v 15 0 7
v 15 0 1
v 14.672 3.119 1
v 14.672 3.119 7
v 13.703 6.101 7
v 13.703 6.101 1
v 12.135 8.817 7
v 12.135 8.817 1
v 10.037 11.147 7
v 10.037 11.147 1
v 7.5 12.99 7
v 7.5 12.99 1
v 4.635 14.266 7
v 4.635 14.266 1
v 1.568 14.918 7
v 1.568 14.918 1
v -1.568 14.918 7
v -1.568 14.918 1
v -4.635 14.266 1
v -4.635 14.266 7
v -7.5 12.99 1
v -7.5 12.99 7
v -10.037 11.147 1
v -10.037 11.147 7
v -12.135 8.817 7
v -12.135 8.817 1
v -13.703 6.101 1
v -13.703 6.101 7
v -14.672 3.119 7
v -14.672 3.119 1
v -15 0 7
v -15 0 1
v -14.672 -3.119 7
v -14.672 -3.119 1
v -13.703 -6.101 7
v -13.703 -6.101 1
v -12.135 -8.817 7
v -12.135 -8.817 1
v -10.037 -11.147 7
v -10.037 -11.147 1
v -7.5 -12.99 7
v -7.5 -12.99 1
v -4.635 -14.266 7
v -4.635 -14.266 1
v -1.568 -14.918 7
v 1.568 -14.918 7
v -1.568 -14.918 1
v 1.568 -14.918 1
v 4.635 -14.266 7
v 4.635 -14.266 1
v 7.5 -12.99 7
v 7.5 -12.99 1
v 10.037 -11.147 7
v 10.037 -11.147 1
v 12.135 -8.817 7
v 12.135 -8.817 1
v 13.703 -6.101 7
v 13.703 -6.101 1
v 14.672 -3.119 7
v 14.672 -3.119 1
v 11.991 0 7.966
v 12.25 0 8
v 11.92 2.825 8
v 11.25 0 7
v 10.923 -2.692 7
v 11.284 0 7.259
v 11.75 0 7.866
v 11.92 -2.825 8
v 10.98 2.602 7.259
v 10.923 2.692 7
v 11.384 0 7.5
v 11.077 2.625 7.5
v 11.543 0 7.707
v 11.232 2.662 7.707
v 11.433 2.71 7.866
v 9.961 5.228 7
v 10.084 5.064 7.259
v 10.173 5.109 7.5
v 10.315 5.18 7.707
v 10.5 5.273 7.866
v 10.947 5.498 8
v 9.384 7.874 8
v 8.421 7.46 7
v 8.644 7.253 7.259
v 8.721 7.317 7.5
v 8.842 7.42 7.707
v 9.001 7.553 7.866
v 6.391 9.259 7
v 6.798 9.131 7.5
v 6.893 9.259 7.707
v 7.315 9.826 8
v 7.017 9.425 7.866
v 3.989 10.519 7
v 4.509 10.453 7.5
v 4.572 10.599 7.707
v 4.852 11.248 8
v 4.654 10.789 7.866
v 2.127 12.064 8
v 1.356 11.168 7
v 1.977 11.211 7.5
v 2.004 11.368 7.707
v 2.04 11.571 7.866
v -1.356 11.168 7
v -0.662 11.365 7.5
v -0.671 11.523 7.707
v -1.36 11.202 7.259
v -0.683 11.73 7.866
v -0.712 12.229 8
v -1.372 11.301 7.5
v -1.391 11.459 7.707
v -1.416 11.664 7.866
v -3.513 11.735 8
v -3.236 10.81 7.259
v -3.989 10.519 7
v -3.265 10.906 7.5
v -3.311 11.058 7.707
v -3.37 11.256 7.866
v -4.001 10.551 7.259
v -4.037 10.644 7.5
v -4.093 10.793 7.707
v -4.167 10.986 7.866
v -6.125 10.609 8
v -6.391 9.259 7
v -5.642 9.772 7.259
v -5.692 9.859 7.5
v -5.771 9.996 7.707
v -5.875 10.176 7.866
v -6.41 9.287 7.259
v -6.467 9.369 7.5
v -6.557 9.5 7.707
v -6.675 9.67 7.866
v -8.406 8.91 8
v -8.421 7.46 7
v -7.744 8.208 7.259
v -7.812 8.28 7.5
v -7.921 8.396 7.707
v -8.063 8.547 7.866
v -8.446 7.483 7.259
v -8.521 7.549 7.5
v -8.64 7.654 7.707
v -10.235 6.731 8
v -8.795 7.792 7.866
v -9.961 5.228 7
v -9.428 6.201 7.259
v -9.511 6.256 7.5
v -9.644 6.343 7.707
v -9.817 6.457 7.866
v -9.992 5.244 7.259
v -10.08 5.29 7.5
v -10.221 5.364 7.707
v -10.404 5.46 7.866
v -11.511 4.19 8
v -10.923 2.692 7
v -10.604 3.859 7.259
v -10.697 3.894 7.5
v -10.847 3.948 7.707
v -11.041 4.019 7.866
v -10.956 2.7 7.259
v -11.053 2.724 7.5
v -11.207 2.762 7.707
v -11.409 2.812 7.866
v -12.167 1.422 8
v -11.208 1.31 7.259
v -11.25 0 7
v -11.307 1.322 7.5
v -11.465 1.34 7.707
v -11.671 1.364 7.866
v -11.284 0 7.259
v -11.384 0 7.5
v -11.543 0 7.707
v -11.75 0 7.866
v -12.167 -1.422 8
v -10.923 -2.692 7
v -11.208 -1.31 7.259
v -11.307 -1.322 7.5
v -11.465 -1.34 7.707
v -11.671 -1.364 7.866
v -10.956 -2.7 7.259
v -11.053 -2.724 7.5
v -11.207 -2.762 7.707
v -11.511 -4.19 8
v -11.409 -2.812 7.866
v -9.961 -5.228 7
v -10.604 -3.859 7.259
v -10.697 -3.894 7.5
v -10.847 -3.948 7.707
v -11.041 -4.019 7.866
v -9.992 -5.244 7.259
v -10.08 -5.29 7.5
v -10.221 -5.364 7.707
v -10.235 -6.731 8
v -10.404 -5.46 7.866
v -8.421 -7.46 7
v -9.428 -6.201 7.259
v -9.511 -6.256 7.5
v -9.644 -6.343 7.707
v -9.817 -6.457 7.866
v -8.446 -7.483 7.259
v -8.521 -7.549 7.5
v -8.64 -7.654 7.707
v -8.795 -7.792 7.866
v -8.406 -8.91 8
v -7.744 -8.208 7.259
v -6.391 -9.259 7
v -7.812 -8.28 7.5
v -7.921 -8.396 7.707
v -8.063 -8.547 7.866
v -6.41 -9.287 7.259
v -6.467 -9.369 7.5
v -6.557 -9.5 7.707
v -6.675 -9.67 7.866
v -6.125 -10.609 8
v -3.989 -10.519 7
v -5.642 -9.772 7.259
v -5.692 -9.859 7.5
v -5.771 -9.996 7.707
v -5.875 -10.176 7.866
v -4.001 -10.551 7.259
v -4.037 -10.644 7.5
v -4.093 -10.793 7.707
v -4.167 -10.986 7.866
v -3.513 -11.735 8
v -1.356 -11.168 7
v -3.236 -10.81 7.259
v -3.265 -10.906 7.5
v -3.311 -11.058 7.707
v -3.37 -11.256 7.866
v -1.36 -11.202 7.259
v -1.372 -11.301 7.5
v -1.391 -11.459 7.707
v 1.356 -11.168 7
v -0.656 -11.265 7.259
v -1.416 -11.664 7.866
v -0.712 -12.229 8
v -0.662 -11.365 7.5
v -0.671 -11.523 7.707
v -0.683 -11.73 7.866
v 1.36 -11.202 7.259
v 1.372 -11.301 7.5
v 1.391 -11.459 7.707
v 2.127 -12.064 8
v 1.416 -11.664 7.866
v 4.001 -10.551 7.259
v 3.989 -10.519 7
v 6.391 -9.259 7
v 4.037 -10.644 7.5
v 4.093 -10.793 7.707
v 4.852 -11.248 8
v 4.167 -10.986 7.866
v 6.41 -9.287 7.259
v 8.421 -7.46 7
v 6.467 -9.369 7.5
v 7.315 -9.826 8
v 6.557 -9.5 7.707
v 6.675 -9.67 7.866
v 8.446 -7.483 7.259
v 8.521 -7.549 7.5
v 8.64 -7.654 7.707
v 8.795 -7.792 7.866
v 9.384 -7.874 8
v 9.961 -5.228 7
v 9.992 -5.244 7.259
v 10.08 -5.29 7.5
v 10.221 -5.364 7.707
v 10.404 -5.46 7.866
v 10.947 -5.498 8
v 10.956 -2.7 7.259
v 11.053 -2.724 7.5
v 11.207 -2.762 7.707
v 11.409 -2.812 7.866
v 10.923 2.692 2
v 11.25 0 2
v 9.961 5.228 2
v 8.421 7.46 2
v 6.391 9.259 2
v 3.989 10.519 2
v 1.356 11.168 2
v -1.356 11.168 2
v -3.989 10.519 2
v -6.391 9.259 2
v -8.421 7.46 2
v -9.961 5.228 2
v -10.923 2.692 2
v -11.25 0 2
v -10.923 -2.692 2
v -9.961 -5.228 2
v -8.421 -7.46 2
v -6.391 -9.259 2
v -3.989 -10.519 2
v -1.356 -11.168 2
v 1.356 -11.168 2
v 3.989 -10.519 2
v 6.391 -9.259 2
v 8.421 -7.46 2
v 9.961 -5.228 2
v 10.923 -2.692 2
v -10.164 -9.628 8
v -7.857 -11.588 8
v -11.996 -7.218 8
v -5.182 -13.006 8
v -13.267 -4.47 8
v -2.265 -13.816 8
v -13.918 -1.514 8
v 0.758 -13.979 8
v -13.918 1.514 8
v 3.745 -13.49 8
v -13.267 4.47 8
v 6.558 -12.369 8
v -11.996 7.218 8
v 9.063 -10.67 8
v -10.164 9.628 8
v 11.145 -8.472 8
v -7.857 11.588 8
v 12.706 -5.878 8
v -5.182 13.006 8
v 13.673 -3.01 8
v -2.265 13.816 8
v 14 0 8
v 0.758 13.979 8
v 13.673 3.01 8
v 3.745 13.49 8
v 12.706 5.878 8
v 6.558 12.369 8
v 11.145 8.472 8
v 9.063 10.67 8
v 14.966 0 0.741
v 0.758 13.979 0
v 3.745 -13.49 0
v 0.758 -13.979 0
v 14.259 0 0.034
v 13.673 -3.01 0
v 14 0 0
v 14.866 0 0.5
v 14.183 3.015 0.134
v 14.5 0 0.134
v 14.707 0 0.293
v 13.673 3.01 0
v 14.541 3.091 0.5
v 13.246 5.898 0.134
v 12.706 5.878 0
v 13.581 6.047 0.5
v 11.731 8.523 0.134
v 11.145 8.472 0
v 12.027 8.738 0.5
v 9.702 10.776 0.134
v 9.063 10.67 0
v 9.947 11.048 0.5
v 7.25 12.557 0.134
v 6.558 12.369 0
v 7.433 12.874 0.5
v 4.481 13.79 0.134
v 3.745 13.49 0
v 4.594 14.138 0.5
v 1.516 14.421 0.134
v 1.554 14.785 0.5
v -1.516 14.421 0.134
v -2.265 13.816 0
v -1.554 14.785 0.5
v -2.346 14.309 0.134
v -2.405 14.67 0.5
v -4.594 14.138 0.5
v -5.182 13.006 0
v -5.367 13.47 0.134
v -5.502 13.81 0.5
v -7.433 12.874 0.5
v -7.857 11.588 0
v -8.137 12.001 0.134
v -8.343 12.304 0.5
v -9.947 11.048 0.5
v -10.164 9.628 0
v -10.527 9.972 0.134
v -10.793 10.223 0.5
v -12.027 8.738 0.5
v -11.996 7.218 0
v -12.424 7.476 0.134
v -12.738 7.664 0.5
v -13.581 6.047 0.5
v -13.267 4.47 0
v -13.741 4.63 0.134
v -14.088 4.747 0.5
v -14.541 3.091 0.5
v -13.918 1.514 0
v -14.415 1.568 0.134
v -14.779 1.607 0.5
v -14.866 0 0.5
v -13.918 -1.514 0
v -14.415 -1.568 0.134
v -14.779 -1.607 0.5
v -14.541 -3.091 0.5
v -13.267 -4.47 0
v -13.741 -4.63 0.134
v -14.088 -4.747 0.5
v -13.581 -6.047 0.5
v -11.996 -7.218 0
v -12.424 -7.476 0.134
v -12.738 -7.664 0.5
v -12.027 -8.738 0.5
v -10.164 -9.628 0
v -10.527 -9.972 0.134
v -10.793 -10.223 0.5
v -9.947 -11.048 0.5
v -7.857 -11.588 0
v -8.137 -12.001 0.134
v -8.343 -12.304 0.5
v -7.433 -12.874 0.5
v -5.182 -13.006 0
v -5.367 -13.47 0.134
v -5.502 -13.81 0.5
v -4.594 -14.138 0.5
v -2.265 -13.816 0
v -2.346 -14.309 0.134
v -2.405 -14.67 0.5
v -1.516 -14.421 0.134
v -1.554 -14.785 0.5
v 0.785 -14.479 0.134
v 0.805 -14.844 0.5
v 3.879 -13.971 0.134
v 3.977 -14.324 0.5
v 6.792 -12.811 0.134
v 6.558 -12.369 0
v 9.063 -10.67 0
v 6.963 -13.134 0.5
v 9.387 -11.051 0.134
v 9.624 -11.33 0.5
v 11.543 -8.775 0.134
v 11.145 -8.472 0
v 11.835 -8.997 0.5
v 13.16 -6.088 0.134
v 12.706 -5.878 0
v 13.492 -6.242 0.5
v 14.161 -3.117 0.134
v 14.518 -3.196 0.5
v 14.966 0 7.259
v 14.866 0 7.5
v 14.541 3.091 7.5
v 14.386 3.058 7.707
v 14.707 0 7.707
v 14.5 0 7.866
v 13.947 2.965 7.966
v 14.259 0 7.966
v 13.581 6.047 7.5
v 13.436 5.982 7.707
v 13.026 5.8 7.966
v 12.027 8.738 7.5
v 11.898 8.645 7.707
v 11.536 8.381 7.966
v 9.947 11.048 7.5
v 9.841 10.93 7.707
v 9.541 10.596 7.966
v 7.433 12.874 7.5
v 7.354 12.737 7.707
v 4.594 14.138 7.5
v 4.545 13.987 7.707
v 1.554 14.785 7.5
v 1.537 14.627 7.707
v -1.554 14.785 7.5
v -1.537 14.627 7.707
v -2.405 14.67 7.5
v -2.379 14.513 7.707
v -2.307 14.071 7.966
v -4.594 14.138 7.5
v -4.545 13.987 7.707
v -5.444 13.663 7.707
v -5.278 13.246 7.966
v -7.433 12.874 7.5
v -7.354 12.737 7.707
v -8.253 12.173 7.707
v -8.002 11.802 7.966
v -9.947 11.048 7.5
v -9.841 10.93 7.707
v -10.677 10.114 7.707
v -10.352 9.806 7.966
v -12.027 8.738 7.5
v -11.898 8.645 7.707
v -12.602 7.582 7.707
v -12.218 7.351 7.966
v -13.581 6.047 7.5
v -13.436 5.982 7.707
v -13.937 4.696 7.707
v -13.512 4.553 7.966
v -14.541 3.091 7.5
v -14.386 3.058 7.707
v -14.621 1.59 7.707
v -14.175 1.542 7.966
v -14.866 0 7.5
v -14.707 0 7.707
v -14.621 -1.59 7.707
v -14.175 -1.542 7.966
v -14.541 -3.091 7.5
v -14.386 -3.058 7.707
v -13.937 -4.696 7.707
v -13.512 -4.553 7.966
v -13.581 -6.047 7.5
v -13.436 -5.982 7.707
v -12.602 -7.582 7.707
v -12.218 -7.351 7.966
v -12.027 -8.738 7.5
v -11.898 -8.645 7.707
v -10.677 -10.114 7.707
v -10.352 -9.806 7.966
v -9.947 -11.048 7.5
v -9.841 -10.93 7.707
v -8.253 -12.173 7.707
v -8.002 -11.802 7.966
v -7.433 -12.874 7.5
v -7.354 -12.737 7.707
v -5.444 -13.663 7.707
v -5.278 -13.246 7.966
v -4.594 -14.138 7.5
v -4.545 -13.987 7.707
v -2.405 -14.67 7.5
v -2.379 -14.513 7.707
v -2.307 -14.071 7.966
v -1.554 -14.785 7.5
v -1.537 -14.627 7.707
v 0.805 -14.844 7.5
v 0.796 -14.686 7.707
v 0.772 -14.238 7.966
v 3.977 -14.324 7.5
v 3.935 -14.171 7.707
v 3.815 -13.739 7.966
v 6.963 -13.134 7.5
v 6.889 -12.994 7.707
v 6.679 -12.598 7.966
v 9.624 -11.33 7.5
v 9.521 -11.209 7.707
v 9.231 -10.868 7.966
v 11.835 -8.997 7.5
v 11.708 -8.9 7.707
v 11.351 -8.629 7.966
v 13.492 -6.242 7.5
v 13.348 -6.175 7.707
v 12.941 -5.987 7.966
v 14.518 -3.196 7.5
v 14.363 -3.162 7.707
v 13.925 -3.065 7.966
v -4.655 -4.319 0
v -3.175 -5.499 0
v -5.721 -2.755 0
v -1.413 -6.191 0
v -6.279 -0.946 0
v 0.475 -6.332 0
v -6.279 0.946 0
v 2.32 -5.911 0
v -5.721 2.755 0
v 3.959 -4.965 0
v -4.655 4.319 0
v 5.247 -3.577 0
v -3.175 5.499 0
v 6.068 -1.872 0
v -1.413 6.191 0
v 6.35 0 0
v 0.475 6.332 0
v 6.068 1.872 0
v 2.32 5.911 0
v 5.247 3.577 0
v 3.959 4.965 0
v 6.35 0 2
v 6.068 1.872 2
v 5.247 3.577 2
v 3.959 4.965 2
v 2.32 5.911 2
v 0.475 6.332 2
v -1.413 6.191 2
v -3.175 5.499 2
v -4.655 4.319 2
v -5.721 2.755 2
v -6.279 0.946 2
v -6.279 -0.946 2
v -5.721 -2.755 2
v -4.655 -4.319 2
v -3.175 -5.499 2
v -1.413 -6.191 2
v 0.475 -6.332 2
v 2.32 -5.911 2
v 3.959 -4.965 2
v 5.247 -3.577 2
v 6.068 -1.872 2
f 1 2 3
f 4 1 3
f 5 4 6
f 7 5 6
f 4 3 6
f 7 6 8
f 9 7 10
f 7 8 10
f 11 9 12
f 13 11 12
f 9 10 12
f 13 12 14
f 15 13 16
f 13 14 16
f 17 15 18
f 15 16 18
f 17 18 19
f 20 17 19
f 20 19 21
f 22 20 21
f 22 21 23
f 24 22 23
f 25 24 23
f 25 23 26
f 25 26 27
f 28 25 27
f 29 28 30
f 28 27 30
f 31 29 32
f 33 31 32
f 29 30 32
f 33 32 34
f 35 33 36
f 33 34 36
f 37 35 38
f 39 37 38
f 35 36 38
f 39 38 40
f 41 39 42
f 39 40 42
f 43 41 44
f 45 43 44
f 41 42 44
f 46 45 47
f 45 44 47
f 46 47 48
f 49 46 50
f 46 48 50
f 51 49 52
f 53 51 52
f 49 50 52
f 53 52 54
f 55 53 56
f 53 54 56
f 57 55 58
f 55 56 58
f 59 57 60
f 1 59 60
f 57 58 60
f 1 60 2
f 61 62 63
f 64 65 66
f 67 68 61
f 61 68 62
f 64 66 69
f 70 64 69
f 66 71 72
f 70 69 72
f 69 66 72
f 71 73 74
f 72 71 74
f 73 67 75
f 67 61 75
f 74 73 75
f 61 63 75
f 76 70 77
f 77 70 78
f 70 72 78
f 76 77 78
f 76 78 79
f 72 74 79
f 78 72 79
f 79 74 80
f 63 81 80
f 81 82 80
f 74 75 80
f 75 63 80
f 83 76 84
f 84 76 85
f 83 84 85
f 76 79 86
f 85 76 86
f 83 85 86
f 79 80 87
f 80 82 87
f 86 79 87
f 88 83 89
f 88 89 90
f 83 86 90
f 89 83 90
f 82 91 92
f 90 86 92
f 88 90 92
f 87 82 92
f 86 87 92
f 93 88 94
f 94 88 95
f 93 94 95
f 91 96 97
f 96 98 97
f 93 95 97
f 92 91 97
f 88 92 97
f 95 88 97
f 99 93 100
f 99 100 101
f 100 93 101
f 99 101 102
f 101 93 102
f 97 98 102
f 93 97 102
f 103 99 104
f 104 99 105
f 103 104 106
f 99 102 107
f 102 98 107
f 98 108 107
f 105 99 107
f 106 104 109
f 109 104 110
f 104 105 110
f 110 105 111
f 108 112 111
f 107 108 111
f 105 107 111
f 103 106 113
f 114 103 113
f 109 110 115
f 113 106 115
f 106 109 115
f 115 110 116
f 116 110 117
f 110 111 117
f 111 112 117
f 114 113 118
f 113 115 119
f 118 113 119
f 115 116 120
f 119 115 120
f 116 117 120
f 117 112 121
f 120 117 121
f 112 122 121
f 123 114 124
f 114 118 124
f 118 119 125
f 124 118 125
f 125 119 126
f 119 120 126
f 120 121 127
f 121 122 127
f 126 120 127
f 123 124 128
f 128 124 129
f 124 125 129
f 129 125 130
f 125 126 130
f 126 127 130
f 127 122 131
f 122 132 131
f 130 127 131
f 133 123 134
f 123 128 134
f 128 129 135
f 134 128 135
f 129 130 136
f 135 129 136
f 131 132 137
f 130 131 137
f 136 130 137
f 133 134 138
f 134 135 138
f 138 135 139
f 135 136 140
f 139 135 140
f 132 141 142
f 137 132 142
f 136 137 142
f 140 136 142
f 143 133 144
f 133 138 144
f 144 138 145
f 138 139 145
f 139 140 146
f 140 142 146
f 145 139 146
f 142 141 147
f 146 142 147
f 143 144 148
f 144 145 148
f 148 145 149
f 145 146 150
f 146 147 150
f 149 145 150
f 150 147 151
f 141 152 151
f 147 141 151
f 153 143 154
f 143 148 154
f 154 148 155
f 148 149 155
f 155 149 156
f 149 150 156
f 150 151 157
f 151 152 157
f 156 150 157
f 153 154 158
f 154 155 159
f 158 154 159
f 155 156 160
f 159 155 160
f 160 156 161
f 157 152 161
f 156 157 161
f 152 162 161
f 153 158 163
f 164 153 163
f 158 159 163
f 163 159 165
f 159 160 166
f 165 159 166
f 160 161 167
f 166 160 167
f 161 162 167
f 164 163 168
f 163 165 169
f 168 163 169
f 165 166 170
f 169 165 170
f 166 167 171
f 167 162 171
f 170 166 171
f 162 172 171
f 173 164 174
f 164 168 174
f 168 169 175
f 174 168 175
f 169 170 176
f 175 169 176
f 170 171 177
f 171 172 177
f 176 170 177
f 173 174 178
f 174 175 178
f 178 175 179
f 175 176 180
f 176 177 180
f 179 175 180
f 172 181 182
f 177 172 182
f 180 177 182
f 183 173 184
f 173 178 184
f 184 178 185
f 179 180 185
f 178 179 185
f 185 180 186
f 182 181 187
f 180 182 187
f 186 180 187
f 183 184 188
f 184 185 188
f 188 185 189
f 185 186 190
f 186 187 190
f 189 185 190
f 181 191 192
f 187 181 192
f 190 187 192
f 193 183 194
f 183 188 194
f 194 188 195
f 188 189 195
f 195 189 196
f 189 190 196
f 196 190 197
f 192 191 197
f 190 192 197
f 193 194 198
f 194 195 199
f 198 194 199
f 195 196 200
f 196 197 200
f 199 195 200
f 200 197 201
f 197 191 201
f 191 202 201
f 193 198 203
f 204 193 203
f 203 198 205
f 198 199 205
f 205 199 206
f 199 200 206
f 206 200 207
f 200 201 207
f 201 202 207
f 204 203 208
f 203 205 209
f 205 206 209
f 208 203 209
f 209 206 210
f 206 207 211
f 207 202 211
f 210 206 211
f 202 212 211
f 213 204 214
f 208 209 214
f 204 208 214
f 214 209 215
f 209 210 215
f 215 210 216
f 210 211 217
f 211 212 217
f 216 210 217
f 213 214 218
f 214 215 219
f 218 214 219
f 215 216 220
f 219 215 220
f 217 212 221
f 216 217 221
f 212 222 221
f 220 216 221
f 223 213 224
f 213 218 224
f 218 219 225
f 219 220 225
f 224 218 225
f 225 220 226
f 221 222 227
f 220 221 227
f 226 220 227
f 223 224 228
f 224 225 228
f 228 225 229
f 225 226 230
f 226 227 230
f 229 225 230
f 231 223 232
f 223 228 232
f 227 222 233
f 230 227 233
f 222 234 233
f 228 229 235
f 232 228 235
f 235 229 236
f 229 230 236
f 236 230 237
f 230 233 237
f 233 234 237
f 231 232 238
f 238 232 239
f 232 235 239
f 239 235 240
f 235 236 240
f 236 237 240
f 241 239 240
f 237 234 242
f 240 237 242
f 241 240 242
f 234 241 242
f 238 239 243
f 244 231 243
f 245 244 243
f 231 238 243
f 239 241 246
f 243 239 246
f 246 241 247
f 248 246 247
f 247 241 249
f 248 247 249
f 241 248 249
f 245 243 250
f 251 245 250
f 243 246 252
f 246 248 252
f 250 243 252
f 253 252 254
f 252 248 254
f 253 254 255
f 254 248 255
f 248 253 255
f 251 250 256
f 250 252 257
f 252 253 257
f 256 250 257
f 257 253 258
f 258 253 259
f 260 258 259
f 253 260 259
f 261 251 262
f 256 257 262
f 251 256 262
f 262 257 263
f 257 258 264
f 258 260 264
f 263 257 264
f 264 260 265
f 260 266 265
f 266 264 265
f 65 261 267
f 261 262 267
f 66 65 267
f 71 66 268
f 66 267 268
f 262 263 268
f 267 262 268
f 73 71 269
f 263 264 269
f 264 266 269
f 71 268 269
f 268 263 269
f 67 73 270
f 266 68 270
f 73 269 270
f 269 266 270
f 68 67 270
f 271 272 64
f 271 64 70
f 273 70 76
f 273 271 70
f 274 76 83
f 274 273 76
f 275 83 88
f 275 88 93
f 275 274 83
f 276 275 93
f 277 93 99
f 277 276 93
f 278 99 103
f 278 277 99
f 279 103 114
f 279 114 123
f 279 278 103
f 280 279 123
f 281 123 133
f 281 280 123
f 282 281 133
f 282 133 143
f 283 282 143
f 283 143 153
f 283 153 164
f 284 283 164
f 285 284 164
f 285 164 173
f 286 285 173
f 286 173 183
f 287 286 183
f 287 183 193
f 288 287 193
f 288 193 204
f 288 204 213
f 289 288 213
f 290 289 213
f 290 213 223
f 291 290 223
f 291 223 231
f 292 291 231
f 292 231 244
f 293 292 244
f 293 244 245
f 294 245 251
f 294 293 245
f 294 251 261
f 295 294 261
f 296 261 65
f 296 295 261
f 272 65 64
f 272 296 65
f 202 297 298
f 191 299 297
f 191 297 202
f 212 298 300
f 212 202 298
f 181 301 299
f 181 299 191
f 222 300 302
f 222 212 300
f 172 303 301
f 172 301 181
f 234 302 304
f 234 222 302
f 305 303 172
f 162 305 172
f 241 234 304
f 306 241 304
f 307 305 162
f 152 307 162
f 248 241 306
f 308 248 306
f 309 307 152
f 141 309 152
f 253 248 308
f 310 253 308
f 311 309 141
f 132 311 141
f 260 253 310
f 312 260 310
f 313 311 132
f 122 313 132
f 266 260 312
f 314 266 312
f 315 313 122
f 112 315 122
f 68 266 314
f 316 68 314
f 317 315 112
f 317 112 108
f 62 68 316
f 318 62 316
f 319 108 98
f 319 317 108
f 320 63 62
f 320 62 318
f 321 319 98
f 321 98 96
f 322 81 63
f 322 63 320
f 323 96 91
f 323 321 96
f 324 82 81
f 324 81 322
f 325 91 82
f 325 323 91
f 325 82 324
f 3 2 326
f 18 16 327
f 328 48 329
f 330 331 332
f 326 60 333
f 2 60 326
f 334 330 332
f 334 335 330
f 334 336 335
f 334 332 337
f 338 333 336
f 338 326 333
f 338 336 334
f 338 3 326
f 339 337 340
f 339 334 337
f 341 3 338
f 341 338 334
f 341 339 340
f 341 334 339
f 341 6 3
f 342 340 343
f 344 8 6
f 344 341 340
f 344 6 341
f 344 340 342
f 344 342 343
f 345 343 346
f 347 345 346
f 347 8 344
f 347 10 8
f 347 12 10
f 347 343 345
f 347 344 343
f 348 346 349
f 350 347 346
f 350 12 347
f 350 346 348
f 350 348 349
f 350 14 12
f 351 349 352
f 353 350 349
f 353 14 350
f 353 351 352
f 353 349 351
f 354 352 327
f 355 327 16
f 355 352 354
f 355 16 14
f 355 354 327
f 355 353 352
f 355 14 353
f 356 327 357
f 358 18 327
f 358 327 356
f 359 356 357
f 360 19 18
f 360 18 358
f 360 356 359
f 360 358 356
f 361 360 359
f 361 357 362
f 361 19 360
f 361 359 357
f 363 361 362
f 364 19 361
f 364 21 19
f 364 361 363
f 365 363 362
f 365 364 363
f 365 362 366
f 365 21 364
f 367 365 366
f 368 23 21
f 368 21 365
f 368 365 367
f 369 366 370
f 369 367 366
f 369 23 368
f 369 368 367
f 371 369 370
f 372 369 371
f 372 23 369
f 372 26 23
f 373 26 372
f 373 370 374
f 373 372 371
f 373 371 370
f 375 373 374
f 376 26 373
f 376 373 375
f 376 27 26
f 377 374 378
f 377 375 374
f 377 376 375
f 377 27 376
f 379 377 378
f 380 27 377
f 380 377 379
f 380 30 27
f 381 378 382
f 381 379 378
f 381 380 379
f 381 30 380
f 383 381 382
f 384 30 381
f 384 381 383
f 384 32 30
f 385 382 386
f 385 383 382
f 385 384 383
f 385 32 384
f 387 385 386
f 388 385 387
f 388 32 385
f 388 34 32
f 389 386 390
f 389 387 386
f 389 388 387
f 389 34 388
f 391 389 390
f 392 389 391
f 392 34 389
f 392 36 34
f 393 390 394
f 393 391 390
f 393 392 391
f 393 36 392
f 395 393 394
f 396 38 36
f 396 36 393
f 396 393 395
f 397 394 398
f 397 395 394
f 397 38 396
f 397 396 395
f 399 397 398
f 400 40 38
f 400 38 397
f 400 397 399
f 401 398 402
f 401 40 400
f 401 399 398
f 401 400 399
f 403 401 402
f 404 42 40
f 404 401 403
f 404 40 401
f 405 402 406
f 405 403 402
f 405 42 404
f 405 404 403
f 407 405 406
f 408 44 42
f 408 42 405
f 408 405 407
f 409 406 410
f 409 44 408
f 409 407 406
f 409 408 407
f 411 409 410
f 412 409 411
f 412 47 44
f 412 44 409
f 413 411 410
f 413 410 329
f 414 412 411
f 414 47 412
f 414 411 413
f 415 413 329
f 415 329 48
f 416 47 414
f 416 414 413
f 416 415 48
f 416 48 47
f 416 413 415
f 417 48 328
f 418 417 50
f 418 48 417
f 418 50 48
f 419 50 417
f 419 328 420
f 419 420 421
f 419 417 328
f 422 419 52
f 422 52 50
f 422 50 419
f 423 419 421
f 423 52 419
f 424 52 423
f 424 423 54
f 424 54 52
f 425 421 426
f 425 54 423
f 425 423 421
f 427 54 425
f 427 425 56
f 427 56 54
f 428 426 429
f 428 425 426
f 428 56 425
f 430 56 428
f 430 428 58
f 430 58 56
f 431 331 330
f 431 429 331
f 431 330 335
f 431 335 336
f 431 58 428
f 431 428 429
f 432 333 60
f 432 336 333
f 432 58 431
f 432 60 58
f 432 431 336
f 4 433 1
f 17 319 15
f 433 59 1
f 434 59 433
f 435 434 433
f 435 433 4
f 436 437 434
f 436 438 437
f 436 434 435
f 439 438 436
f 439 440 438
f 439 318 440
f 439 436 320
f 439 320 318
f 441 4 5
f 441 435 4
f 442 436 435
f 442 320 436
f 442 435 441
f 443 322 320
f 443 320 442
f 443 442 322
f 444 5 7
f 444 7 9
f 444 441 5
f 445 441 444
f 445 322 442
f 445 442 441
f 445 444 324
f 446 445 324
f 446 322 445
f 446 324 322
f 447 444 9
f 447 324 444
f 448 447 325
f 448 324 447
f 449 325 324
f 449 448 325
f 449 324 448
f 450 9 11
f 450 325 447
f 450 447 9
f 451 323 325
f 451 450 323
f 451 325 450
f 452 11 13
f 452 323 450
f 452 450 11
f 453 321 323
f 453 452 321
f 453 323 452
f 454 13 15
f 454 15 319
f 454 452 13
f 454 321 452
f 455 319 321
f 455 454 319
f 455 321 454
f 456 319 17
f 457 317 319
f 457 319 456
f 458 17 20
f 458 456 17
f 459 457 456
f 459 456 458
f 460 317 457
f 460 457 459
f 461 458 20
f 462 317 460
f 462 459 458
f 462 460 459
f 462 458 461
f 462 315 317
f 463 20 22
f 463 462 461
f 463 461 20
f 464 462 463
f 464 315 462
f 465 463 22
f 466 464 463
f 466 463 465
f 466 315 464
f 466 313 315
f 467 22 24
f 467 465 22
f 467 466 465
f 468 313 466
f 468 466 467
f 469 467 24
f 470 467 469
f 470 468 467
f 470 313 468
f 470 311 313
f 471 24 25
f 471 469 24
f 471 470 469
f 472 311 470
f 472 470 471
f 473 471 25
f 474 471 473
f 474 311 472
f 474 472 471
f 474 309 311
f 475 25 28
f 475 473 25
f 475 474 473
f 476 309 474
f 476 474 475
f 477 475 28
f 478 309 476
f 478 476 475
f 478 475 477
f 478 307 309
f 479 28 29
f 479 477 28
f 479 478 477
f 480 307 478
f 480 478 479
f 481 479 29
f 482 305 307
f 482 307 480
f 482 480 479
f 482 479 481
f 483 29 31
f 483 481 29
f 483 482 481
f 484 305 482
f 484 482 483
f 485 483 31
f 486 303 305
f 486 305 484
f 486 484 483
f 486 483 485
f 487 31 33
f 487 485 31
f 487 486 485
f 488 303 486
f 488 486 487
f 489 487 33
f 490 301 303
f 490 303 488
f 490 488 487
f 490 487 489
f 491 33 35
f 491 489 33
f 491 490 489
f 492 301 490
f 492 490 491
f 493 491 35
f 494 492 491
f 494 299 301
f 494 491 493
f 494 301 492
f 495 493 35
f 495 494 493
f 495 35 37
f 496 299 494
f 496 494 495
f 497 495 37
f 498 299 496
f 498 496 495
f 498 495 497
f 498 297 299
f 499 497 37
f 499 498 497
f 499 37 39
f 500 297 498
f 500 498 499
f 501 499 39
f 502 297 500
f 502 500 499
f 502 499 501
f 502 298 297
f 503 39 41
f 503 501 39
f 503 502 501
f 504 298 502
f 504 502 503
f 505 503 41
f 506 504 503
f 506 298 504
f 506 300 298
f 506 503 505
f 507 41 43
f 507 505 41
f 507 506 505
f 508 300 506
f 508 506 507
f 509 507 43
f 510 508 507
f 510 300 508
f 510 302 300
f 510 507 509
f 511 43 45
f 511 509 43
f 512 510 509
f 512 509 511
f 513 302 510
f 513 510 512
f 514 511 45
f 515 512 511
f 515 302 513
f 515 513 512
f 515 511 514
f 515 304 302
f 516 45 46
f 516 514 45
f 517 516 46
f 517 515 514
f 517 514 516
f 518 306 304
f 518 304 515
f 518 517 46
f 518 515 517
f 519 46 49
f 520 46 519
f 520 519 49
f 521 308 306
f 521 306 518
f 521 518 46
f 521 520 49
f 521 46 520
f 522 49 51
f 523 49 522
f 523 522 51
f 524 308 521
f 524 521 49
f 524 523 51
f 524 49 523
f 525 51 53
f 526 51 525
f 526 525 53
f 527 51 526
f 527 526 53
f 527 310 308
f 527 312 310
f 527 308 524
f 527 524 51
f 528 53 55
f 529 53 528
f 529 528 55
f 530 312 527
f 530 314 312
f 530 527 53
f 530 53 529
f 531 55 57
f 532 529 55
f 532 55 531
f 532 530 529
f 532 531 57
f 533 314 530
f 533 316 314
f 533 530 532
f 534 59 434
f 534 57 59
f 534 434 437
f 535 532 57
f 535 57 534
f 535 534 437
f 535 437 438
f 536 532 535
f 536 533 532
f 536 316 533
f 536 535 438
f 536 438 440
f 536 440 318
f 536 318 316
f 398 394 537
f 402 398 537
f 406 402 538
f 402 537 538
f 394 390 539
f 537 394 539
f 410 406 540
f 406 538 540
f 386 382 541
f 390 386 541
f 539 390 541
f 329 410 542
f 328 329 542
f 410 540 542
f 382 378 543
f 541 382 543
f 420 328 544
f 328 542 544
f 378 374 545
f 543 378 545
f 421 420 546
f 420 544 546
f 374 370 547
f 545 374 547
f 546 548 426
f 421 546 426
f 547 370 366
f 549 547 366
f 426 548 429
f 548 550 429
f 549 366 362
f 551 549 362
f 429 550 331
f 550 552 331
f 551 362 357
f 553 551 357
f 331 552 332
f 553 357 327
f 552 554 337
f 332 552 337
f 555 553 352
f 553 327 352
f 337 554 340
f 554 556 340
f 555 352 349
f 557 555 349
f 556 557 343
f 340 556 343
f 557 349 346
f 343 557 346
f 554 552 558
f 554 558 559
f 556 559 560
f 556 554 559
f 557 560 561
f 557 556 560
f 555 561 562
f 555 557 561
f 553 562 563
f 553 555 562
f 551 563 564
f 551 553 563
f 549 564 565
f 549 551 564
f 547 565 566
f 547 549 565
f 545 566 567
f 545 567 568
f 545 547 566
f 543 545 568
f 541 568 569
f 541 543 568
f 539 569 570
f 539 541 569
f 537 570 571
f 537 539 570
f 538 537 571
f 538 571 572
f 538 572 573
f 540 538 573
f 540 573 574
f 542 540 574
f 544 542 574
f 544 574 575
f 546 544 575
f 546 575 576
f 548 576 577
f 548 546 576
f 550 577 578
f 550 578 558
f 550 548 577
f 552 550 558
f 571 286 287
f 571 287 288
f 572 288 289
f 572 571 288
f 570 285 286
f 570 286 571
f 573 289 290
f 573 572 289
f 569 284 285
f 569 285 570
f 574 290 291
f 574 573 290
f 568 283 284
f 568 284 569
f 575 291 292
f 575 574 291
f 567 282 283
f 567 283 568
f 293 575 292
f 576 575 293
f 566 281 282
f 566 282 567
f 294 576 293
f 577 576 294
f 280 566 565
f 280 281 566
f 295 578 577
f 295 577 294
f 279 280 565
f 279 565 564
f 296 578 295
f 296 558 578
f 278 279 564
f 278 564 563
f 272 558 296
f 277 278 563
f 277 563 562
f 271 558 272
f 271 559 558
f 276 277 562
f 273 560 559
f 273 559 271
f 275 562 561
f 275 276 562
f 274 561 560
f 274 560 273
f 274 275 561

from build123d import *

# Parameters (mm, degrees)
SKETCH1_R           = 15
SKETCH1_R_2         = 11.25
BOSS_EXTRUDE1_DEPTH = 8
SKETCH1_3_R         = 11.25
SKETCH1_3_R_2       = 6.35
BOSS_EXTRUDE2_DEPTH = 2
FILLET1_R           = 1


with BuildPart() as part:
    # Sketch1 → Boss-Extrude1 (new body)
    with BuildSketch(Plane.XY):
        Circle(SKETCH1_R)
        Circle(SKETCH1_R_2, mode=Mode.SUBTRACT)
    extrude(amount=BOSS_EXTRUDE1_DEPTH)

    # Sketch1<3> → Boss-Extrude2 (add)
    with BuildSketch(Plane.XY):
        Circle(SKETCH1_3_R)
        Circle(SKETCH1_3_R_2, mode=Mode.SUBTRACT)
    extrude(amount=BOSS_EXTRUDE2_DEPTH)

    # Fillet1
    fillet1_edges = [part.edges().sort_by_distance(p)[0] for p in [
        (-15, 0, 8),
        (-15, 0, 0),
        (-11.25, 0, 8),
    ]]
    fillet(fillet1_edges, radius=FILLET1_R)


solid = part.part
